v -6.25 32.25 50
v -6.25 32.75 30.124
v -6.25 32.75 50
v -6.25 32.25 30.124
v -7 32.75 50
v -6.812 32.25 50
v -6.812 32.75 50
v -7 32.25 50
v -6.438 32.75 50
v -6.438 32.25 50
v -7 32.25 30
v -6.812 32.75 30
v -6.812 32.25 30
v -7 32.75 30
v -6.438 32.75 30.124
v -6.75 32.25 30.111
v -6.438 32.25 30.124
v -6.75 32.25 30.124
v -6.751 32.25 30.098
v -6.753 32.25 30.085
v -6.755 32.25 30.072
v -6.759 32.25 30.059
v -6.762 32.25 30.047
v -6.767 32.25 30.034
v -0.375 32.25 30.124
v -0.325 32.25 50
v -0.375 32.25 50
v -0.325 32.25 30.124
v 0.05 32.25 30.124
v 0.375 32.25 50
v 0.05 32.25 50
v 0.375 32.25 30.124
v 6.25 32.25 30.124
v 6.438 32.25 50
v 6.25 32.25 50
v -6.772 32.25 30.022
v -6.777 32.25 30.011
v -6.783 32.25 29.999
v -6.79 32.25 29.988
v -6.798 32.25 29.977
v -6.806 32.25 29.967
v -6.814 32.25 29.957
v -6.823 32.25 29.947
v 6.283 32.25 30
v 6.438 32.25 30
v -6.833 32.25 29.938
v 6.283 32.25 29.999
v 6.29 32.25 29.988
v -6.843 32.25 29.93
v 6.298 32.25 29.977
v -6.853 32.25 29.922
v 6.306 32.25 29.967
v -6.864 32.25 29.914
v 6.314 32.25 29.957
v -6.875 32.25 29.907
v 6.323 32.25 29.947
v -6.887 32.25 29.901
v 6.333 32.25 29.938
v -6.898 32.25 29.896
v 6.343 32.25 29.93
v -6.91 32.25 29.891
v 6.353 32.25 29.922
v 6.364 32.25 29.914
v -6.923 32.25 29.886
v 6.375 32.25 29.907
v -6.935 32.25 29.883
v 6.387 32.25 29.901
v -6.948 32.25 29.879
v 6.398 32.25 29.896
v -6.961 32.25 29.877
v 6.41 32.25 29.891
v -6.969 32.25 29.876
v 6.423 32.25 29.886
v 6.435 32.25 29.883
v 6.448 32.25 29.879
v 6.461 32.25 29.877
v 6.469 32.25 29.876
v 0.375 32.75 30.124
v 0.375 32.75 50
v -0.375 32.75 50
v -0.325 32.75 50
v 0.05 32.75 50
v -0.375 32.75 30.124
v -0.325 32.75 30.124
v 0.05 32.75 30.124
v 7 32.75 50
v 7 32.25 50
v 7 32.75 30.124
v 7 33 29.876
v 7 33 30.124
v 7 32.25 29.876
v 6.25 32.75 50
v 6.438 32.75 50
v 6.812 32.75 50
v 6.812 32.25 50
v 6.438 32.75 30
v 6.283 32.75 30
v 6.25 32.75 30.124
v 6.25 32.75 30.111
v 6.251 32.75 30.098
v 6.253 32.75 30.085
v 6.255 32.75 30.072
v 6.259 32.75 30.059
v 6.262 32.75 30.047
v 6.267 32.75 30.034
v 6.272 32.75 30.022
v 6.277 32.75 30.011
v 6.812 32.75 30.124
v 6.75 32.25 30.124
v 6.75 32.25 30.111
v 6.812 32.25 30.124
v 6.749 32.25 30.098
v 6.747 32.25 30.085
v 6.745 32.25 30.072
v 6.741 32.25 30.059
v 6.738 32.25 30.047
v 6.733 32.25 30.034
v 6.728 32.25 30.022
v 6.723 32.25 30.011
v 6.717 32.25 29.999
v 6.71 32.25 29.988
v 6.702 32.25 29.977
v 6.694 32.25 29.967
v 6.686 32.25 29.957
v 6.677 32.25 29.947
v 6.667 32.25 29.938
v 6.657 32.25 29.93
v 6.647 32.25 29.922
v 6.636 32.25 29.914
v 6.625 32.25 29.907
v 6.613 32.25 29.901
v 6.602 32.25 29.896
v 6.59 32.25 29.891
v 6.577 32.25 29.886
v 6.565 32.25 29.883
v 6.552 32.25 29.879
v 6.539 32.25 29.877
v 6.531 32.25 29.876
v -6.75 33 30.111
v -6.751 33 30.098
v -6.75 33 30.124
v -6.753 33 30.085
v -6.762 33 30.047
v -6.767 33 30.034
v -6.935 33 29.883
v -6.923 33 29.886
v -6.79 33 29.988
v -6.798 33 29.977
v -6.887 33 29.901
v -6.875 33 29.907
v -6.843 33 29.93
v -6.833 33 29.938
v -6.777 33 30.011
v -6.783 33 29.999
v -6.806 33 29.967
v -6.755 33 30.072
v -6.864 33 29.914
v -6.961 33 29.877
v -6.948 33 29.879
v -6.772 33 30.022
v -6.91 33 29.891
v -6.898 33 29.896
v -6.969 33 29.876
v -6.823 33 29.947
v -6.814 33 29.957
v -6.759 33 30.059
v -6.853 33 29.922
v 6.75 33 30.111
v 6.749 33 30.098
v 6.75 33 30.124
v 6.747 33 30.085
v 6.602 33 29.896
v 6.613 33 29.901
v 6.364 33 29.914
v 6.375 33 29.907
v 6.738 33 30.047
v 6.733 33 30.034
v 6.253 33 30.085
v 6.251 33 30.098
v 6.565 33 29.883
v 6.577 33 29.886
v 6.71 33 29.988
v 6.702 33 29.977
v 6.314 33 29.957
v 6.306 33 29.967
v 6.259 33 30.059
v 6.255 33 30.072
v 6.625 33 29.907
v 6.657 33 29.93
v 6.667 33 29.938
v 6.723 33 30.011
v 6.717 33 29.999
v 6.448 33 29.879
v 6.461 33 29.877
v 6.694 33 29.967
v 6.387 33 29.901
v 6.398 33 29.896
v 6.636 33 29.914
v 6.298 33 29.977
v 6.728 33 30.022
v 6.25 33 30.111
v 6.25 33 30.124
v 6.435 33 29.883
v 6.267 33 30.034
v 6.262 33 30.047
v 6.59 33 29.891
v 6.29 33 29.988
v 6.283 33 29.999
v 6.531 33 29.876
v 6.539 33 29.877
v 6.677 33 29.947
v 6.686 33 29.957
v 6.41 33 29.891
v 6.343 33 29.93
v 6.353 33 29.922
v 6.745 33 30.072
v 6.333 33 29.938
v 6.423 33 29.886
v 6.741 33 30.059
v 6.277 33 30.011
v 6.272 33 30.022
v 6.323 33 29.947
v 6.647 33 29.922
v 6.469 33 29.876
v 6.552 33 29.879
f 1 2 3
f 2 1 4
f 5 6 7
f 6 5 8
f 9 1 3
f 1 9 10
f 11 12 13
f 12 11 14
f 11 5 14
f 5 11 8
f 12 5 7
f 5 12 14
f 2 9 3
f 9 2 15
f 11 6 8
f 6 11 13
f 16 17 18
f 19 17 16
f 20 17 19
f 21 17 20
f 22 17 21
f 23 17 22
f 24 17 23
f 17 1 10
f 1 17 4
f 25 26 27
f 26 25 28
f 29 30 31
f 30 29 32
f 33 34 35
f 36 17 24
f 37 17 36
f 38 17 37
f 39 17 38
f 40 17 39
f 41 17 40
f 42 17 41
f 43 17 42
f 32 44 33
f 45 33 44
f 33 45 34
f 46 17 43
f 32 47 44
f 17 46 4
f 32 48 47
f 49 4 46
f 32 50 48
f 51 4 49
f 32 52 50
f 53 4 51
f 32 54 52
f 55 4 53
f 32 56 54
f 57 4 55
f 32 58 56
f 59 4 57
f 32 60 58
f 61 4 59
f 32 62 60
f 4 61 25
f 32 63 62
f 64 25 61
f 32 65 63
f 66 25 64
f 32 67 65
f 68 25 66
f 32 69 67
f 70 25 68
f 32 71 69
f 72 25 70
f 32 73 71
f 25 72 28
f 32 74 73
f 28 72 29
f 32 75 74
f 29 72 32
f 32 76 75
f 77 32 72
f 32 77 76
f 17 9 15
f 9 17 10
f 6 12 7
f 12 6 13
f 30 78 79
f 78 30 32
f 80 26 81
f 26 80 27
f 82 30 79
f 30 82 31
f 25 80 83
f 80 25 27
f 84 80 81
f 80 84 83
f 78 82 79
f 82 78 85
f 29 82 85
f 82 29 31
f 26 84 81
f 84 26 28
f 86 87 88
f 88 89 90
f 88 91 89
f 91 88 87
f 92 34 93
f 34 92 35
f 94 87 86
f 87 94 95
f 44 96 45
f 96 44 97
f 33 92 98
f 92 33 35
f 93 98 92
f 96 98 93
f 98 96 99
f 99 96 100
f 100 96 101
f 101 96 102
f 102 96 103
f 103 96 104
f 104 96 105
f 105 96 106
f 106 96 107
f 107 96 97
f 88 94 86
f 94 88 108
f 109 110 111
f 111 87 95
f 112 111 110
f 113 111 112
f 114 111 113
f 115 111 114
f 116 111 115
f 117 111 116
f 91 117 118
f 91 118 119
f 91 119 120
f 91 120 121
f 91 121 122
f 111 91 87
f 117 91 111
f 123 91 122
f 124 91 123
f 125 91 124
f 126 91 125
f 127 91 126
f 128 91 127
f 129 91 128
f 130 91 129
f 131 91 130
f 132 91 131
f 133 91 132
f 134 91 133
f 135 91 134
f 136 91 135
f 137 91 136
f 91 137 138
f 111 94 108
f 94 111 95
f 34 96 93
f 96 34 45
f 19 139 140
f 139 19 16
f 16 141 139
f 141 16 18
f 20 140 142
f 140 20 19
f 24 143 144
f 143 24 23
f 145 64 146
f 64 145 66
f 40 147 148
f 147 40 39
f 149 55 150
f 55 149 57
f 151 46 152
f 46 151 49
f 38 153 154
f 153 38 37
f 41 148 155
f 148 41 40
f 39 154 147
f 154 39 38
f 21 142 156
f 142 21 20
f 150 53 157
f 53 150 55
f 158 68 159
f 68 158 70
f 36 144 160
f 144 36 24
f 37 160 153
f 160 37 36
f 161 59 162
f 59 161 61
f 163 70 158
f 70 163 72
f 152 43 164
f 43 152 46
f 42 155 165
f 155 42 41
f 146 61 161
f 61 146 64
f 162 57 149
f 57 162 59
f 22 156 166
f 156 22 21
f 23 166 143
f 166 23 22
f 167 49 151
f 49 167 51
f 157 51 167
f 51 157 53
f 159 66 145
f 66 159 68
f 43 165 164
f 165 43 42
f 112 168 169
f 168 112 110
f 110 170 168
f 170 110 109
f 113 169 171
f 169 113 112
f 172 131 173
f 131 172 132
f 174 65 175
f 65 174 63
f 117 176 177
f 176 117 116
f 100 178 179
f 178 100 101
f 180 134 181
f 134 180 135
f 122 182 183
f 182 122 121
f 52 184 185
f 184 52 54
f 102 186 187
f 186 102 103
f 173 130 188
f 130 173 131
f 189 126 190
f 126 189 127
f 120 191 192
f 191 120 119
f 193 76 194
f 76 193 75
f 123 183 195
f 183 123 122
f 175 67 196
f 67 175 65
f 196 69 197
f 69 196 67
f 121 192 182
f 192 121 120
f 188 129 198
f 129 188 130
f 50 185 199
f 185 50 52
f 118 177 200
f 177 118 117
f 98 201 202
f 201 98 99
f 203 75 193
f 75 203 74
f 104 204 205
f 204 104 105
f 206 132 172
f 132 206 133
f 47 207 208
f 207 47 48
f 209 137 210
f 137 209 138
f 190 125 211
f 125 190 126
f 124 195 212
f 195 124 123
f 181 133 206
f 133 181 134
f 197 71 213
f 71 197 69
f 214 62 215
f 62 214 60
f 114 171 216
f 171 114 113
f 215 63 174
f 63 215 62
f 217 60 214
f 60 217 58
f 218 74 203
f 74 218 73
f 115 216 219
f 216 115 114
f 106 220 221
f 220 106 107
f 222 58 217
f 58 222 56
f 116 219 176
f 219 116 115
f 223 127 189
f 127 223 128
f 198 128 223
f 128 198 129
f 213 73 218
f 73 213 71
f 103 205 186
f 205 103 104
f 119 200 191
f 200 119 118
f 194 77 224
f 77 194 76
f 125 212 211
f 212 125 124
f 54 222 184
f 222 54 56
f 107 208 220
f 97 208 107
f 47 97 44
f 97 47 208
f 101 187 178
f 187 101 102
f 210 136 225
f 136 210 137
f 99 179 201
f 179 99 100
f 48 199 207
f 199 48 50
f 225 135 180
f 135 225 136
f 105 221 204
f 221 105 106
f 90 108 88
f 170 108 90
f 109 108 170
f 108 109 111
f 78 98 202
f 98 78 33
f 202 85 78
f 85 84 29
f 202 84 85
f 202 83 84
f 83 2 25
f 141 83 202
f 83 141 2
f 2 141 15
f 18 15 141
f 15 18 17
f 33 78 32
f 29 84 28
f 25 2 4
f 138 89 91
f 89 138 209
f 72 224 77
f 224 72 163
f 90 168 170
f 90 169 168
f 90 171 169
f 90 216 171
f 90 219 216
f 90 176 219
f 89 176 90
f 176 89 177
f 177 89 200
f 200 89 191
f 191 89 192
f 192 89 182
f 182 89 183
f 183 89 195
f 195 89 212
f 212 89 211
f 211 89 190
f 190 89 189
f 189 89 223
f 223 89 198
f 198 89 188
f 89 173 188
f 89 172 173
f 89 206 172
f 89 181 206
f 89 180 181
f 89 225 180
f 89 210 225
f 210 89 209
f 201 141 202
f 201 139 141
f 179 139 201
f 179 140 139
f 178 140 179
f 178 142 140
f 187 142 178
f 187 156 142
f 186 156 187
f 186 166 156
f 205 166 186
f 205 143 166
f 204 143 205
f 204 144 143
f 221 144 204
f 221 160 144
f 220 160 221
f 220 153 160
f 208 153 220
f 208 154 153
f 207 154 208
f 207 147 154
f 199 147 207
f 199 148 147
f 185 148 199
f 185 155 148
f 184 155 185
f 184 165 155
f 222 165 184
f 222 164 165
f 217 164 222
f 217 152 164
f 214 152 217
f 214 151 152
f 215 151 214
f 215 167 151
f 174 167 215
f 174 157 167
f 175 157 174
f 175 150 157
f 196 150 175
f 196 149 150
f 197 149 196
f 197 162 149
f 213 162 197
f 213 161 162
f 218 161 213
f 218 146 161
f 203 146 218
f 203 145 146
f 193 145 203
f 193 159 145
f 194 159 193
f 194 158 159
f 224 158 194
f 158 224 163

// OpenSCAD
// ============================================================================
// MODULE: INTEGRATED INTERNAL EMERGENCY LIFE-SUPPORT STORAGE RACK STEPS
// CONFIGURATION: FRAME-INTEGRATED GUIDE CHANNELS (ZERO-BOLT FLANGE DESIGN)
// COMPLIANCE: 0.062" SKELETON WALL THICKNESS RATIO CEILING (DOC ENFORCED)
// ============================================================================

$fn = 120; // Enforce smooth corner blend radii to eliminate stress concentration lines

// --- STORAGE CONFIGURATION CONSTANTS (INCHES) ---
SKELETON_WALL = 0.062;        // Maximum allowed structural framework thickness floor
CANISTER_BAY_W = 14.0;        // Width of emergency gear canister housing bay
SLIDE_TRACK_W = 0.375;        // Width of the sliding retention groove channel
SLIDE_TRACK_D = 0.125;        // Depth of tracking groove cut into the 0.062" ribs
RACK_HEIGHT = 20.0;           // Vertical length of the slide channels

module IntegratedLifeSupportRackSteps() {
    echo("CNC Track: Milling Zero-Bolt Emergency Life-Support Storage Steps");
    
    color("DarkSlateGray")
    union() {
        // --- LEFT OUTBOARD VERTICAL RETAINING RAIL ---
        translate([-CANISTER_BAY_W / 2, 0, 0])
        difference() {
            cube([0.75, 0.50, RACK_HEIGHT]); // Frame-mounted vertical rail block
            // Localized slide tracking slot cut
            translate([0.375 - (SLIDE_TRACK_W / 2), -0.1, -0.1])
            cube([SLIDE_TRACK_W, 0.7, RACK_HEIGHT + 0.2]);
        }
        
        // --- CENTRAL DIVIDER DOUBLE-SLOT STRUCTURAL RAIL ---
        translate([-0.375, 0, 0])
        difference() {
            cube([0.75, 0.50, RACK_HEIGHT]);
            // Left-side slider channel engagement track
            translate([0.05, -0.1, -0.1]) cube([SLIDE_TRACK_W, 0.7, RACK_HEIGHT + 0.2]);
        }
        
        // --- RIGHT OUTBOARD VERTICAL RETAINING RAIL ---
        translate([CANISTER_BAY_W / 2 - 0.75, 0, 0])
        difference() {
            cube([0.75, 0.50, RACK_HEIGHT]);
            translate([0.375 - (SLIDE_TRACK_W / 2), -0.1, -0.1])
            cube([SLIDE_TRACK_W, 0.7, RACK_HEIGHT + 0.2]);
        }
        
        // --- BOTTOM WEIGHT-BEARING RUNNING STEP LEDGE ---
        // Solid horizontal structural platform that transfers downward G-loads straight to the base
        translate([-CANISTER_BAY_W / 2, 0, -SKELETON_WALL * 2])
        difference() {
            cube([CANISTER_BAY_W, 0.75, SKELETON_WALL * 4]);
            
            // Radiused corner fillets to spread dynamic shearing forces symmetrically
            for (corner_offset = [0, CANISTER_BAY_W - 0.5]) {
                translate([corner_offset, -0.1, SKELETON_WALL * 4])
                rotate([-90, 0, 0])
                cylinder(h = 1.0, r = 0.25);
            }
        }
    }
}

module PositionRackInCabin(cabin_wall_radius) {
    // Arrays the storage steps securely against the upper aft structural frames
    translate([0, cabin_wall_radius - 1.25, 30.0]) // Elevated safely behind crew headrest space
    IntegratedLifeSupportRackSteps();
}

// ============================================================================
// CNC WORKSTATION REPRODUCTION AUDIT STAGE
// ============================================================================
PositionRackInCabin(cabin_wall_radius = 33.5);
